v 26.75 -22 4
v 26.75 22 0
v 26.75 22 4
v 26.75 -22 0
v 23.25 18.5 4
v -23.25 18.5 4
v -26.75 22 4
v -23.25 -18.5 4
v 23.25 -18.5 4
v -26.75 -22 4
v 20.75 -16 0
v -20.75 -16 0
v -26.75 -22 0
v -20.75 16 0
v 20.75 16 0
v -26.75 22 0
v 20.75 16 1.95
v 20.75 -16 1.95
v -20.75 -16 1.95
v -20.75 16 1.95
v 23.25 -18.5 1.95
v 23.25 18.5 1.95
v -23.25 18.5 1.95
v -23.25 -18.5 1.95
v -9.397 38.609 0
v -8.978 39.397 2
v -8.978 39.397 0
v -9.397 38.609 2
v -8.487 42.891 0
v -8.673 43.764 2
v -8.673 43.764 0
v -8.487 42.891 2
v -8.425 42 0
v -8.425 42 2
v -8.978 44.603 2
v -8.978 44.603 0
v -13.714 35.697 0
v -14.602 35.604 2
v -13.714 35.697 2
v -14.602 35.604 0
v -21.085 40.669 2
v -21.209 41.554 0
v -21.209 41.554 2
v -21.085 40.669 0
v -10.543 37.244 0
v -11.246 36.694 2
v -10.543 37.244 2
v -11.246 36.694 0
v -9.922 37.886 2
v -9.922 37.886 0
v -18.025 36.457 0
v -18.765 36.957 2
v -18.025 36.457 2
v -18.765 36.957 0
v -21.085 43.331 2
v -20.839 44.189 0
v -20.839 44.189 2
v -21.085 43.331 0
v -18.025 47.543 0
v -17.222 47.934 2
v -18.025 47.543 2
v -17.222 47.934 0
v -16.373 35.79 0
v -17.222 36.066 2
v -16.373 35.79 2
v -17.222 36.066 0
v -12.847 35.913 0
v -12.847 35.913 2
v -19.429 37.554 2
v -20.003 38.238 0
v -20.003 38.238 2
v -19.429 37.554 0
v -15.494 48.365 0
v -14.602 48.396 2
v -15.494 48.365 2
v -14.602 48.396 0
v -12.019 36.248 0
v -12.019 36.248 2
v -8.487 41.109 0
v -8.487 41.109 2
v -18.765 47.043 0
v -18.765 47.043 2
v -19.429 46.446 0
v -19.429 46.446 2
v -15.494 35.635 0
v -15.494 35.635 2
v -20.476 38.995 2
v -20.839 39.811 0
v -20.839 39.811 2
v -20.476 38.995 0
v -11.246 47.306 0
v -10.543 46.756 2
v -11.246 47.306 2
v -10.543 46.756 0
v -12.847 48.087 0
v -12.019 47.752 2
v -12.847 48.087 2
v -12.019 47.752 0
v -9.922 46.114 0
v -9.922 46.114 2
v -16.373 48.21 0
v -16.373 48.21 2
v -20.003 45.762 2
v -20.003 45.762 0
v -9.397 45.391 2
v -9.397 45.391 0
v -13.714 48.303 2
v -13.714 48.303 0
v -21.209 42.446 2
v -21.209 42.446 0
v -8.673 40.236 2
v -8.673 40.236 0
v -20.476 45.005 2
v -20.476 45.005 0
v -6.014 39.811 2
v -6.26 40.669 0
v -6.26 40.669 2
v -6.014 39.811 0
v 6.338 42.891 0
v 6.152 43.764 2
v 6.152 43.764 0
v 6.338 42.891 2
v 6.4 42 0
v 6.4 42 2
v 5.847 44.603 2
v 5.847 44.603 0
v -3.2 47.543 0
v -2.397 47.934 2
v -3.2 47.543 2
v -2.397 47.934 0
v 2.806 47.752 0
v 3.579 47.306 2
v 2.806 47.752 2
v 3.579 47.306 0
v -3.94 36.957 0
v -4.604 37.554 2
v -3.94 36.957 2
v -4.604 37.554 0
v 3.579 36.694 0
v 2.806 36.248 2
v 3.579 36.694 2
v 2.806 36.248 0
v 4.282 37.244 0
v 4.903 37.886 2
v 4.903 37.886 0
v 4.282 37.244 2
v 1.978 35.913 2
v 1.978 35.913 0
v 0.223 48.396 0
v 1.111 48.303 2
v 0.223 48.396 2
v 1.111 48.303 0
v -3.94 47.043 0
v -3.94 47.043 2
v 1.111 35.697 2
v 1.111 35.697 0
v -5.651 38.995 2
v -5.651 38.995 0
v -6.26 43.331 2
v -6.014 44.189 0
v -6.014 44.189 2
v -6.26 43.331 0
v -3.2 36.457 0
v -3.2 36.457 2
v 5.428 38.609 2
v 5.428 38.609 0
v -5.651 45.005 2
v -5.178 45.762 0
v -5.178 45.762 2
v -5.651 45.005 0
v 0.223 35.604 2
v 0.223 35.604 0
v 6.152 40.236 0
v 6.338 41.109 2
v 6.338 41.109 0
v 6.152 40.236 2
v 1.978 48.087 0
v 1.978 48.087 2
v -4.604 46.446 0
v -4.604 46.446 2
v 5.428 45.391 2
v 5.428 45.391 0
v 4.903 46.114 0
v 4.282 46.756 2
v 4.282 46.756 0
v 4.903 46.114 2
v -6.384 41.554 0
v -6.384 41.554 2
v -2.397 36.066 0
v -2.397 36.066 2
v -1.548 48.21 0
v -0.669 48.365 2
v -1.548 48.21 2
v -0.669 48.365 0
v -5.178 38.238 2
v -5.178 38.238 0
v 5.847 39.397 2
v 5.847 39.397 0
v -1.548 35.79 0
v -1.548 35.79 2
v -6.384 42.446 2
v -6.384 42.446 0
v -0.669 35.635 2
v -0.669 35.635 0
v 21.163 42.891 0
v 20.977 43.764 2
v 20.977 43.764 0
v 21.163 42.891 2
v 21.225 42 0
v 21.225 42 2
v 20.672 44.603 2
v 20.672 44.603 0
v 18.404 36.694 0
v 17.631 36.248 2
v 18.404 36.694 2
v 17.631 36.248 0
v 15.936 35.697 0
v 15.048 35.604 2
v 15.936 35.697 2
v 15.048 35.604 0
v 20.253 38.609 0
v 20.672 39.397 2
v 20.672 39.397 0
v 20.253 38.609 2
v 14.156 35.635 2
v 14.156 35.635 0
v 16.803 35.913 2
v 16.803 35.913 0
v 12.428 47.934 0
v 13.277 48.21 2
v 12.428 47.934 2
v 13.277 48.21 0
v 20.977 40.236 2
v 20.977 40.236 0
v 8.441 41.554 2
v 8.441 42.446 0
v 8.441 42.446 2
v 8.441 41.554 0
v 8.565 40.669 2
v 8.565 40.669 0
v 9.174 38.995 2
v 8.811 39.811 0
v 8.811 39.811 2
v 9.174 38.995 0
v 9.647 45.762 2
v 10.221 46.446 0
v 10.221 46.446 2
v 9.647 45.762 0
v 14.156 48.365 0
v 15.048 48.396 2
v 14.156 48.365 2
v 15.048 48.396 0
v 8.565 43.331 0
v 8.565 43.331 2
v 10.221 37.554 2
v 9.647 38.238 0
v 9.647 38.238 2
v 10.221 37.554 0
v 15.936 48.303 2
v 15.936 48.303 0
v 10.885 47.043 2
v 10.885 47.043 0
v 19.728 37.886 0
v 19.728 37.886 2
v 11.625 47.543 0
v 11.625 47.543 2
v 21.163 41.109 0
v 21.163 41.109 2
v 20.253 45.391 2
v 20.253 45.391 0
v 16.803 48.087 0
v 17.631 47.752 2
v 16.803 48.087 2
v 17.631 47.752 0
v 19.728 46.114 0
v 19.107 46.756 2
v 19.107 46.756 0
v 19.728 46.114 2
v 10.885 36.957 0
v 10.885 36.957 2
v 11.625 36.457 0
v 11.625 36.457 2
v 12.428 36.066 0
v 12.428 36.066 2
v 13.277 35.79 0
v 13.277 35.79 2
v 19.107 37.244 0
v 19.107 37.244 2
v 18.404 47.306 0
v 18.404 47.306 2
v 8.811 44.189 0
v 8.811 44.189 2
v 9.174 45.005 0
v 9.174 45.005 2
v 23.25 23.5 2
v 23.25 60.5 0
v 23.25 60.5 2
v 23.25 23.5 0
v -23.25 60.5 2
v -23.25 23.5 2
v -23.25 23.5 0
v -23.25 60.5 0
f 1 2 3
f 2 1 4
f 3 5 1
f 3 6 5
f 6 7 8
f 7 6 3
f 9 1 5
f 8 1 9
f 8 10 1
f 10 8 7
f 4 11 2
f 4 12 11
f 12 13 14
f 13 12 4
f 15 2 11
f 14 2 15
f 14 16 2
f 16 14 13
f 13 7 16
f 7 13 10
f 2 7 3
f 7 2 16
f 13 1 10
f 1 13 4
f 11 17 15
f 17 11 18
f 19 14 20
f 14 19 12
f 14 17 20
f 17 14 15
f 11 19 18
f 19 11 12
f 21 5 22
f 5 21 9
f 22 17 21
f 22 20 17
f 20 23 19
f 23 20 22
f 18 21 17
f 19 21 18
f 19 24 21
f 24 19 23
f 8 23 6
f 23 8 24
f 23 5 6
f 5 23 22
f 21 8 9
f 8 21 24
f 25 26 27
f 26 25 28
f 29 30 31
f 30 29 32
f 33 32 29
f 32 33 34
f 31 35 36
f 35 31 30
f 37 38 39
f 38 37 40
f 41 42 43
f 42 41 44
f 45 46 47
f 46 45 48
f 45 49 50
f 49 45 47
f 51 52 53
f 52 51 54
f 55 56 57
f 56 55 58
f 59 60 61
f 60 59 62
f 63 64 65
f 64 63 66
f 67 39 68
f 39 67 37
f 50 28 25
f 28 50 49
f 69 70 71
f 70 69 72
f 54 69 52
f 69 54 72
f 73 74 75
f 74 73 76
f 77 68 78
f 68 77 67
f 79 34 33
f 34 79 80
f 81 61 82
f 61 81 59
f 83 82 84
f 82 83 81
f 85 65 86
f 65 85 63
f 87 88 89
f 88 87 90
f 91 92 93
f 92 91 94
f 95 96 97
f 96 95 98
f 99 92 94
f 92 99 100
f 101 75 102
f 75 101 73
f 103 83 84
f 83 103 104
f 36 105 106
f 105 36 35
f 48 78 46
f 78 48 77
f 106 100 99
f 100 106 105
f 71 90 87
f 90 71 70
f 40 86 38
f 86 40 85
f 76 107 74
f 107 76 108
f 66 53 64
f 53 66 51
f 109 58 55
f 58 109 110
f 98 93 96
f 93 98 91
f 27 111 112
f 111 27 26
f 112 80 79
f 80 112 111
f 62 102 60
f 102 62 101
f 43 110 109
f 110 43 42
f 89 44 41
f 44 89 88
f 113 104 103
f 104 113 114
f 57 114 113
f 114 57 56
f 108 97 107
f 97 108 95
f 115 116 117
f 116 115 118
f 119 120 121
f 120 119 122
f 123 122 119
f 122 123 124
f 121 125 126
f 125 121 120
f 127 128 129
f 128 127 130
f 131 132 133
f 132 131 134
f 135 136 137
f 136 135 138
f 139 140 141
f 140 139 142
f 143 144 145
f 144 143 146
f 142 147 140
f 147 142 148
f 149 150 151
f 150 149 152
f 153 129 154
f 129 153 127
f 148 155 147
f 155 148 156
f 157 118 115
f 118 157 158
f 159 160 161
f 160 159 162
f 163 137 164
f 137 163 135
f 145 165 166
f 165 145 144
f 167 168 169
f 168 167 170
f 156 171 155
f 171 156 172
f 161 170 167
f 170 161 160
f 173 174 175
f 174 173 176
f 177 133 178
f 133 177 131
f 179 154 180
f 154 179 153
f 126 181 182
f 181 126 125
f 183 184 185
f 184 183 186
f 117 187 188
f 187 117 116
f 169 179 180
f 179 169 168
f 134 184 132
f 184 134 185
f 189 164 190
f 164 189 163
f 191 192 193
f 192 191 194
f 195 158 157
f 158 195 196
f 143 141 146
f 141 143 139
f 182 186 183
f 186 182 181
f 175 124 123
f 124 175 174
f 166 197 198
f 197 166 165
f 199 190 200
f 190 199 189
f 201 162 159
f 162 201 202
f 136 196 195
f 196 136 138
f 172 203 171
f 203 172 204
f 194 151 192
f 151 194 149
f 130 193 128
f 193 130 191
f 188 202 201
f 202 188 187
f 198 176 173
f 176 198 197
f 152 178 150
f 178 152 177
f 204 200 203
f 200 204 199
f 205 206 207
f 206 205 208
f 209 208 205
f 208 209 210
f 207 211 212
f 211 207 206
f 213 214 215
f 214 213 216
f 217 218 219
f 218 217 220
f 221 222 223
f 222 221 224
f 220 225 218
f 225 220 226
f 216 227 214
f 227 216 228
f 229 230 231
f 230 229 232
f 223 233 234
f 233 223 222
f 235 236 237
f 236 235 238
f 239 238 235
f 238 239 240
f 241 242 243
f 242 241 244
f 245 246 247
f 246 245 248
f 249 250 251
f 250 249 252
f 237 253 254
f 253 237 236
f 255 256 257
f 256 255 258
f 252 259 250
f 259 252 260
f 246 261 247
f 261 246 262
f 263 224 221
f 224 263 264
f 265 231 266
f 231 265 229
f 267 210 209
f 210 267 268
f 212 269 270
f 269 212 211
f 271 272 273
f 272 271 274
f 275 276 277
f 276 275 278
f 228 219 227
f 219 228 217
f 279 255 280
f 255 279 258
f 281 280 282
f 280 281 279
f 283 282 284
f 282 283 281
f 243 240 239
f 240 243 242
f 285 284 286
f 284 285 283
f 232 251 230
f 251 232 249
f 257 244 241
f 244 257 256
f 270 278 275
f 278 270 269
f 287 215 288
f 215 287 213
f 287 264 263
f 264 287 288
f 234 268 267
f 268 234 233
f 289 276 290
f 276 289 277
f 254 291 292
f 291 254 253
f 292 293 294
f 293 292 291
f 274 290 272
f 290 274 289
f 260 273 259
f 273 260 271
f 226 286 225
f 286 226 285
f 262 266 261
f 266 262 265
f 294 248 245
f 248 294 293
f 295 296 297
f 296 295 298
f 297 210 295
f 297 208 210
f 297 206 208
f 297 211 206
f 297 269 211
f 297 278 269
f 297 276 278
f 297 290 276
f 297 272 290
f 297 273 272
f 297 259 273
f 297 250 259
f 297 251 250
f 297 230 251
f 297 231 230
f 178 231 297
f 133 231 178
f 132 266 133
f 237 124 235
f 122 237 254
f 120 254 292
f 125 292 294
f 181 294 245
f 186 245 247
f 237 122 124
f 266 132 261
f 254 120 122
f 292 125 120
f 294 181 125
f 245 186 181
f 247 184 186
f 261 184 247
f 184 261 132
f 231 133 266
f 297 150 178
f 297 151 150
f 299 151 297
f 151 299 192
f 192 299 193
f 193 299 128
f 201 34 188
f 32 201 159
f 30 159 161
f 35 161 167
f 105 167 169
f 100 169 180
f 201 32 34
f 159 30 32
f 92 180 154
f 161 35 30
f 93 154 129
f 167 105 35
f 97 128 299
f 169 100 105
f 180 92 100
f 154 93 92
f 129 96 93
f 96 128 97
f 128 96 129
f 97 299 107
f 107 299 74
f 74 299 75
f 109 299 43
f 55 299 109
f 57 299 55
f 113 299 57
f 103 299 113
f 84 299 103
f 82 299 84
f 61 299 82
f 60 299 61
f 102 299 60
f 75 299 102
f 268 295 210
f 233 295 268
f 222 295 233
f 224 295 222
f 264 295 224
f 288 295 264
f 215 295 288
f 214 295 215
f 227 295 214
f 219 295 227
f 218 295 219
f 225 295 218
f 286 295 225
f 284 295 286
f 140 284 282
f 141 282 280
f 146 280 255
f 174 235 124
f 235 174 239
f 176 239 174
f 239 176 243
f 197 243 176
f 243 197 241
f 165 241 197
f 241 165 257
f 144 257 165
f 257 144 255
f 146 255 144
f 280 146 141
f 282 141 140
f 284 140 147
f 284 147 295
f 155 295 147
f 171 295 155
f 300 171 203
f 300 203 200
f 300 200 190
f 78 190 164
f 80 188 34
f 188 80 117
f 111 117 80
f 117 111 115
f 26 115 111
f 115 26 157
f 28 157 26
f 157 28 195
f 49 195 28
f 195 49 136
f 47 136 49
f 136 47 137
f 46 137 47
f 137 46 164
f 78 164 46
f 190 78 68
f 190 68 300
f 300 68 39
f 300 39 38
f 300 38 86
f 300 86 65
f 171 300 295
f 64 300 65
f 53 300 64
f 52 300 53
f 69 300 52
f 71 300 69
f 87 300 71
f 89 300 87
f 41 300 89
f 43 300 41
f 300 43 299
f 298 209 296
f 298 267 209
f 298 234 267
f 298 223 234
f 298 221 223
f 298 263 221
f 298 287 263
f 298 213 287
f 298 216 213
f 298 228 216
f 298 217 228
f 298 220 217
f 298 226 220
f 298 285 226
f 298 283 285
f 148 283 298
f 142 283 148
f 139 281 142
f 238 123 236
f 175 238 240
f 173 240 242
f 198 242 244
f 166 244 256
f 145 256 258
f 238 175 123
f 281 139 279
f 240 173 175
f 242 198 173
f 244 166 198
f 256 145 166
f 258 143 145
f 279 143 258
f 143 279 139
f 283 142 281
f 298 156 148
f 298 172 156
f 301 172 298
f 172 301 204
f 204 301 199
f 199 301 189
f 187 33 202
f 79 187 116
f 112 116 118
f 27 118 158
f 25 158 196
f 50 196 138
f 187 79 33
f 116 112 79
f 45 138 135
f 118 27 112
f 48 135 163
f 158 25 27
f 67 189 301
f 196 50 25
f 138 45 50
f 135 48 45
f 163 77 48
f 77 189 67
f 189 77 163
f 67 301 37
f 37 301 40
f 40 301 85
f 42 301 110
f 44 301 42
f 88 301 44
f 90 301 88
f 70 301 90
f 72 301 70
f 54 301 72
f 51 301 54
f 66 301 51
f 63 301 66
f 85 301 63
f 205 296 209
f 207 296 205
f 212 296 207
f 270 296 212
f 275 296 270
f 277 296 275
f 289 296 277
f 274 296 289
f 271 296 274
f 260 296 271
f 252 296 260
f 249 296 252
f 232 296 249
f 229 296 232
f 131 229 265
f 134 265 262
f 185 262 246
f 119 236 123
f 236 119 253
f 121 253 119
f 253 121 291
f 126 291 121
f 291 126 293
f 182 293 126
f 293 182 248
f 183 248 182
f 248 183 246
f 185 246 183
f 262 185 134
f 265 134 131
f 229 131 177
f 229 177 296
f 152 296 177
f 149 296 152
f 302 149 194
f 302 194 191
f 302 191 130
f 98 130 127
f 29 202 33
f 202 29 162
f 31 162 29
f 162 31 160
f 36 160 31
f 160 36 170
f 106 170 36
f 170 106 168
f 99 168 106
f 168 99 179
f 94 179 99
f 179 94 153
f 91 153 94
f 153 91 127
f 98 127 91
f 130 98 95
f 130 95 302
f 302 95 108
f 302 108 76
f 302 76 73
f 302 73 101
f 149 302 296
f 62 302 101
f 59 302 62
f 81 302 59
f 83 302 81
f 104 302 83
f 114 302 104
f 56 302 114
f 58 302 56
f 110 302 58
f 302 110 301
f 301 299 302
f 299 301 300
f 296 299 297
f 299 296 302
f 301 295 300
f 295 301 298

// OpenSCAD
// Title: Picture Frame
// Author: http://www.thingiverse.com/Jinja
// Date: 28/9/2013

/////////// START OF PARAMETERS /////////////////

// The height of the picture
height = 45.5;

// The width of the picture
width = 36;

// The width of the frame border
border = 6;

// How much the border overlaps the edge of the picture
overlap = 2;

// How thick the frame is in total
thickness = 4;

// How thick the backing is
back_thickness = 2;

// The diameter of the magnet holes, 0 if you don't want holes. Even if you're not adding magnets, adding holes uses less plastic.
magnet_diameter = 12.8;

// whether or not to include a stand
stand = "NoStand"; //[ Stand, NoStand ]

// calibration, how many 10ths of a millimeter to adjust the backing size so it is a snug fit in the frame. Increase if it's too loose, decrease if it's too tight. Once you've found the right value for your printer you should be able to print frames of any size. Experiment with small frames first.
calibration = 0; //[-10:10]

// What to include on the plate
plate = "Both"; //[ Back, Front, Both ]


/////////// END OF PARAMETERS /////////////////
rounded = 0.7*1;
overhang=45*1;

adjust = calibration/10;

$fs=0.3*1;
//$fa=5*1; //smooth
$fa=8*1; //nearly smooth
//$fa=20*1; //rough


if( ( plate == "Front" ) || ( plate == "Both" ) )
{
	front( height, width, border, overlap, thickness, back_thickness, stand );
}

if( ( plate == "Back" ) || ( plate == "Both" ) )
{
	translate([0, width+border ,back_thickness*0.5])
	back( height+adjust+1, width+adjust+1, back_thickness, magnet_diameter);
}

module front( height, width, border, overlap, thickness, back_thickness, stand )
{
	difference()
	{
		translate([0,0,thickness*0.5])
		frame( height, width, border, overlap, thickness );
		translate([0,0,thickness-(0.5*back_thickness)])
		back( height+1, width+1, back_thickness*1.05 );
	}
	y = (height*0.7)*cos(75);
	x = y*cos(75);
	s = border-overlap-0.5;
	if( stand=="Stand" )
	{
		translate([height*0.5+s+0.5,0,thickness])
		hull()
		{
			translate([-s*0.5,0,0])
			cube([s,s,0.01], true);
			translate([-1-x,0,y])
			rotate([90,0,0])
			cylinder(s,1,1,true);
		}
	}
}


module back( height, width, back, diam )
{
	gap = 1;
	hremaining = (((height-diam)/2)-gap); 
	hnum=floor( hremaining/(diam+gap) );
	hspacing=((hremaining-((diam+gap)*hnum))/(hnum+1))+diam+gap;
	wremaining = (((width-diam)/2)-gap); 
	wnum=floor( wremaining/(diam+gap) );
	wspacing=((wremaining-((diam+gap)*wnum))/(wnum+1))+diam+gap;
	difference()
	{
		cube( [ height, width, back ], true );
		if( diam > 0 )
		{
			translate([0,0,-back])
			for(i=[-hnum:1:hnum])
			{
				for(j=[-wnum:1:wnum])
				{
					translate([i*hspacing,j*wspacing,0])
					cylinder( back*2, diam*0.5, diam*0.5 );
				}
			}
		}
	}
}

module frame( height, width, border, overlap, back )
{
	difference()
	{
		cube( [ height+2*(border-overlap), width+2*(border-overlap), back ], true );
		translate([0,0,-1])
		cube( [ height+2*(-overlap), width+2*(-overlap), back+2 ], true );
	}
}

module cutter(dist, overhang)
{
	size = dist*2;

	translate([dist,-dist,-dist])
	cube([size,size,size]);

	translate([-dist-size,-dist,-dist])
	cube([size,size,size]);

	translate([dist,-dist,0])
	rotate([0,-overhang,0])
	cube([size,size,size]);

	translate([-dist,-dist,0])
	rotate([0,-90+overhang,0])
	cube([size,size,size]);

	translate([dist,-dist,0])
	rotate([0,90+overhang,0])
	cube([size,size,size]);

	translate([-dist,-dist,0])
	rotate([0,180-overhang,0])
	cube([size,size,size]);

}

module diamond( rounded )
{
	dist = rounded;
	difference()
	{
		cube([2*rounded,2*rounded,2*rounded], true);
		for(i=[0:45:179])
		{
			rotate([0,0,i])
			cutter(dist, overhang);
		}
	}
}
